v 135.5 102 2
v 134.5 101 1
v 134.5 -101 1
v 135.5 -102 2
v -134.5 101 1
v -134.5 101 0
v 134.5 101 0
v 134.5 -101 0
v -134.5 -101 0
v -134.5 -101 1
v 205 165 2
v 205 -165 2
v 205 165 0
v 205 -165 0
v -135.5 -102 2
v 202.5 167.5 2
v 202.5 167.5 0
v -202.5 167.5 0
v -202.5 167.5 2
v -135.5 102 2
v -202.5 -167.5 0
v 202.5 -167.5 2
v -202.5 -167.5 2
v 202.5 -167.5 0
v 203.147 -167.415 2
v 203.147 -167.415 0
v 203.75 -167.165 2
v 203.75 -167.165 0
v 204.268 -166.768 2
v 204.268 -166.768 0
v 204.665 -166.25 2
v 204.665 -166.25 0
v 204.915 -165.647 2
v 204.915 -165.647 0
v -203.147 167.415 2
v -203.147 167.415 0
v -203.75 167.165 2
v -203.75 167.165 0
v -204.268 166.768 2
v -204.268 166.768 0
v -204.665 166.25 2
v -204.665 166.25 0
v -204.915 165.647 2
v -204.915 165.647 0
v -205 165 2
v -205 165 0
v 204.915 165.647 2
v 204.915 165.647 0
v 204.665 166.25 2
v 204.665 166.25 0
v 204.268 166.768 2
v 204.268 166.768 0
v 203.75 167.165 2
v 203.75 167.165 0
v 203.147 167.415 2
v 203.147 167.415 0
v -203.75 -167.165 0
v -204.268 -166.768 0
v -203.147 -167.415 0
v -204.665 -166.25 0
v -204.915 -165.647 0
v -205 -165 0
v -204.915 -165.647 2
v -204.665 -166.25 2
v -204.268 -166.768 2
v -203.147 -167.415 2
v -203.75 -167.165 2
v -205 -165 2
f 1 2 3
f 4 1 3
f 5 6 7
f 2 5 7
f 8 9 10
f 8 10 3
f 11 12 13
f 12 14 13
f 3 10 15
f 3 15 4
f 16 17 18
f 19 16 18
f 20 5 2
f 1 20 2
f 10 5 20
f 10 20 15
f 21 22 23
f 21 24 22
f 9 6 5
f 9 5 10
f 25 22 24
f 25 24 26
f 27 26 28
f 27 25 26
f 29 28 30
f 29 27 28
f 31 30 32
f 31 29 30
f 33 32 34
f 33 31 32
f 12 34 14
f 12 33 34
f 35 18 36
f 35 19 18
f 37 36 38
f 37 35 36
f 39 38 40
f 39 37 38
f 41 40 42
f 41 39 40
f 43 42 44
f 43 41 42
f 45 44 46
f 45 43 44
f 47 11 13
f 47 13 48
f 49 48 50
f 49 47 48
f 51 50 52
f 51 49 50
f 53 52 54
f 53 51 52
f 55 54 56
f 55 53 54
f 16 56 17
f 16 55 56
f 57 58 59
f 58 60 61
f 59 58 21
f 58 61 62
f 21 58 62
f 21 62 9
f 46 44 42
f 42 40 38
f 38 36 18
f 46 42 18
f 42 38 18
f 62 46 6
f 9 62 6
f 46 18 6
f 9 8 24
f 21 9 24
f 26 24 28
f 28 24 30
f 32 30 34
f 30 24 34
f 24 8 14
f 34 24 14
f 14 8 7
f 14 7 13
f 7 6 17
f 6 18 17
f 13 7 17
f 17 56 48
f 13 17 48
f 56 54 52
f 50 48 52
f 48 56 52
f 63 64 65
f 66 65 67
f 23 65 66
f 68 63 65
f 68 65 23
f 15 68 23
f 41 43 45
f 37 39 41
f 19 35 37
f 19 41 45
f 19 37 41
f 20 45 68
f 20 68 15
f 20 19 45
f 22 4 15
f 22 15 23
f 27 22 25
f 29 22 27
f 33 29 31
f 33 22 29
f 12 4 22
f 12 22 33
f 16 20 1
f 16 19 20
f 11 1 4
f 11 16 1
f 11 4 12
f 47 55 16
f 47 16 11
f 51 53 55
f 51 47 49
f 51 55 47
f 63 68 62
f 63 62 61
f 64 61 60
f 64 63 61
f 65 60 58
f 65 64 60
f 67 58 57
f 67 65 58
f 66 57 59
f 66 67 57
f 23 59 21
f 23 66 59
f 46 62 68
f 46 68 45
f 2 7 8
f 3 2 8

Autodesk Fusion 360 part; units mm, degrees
sketch "Sketch1" plane through (0, 0, 0) normal (0, 0, 1) x (1, 0, 0)
  line L0 (0, 101) -> (134.5, 101)
  line L1 (134.5, 101) -> (134.5, 0)
  line L2 (134.5, 0) -> (205, 0)
  line L3 (205, 0) -> (205, 167.5)
  line L4 (205, 167.5) -> (0, 167.5)
  line L5 (0, 167.5) -> (0, 101)
  line L6 (-134.5, 101) -> (-134.5, 0)
  line L7 (-205, 0) -> (-205, 167.5)
  line L8 (-205, 167.5) -> (0, 167.5)
  line L9 (0, 101) -> (-134.5, 101)
  line L10 (0, 167.5) -> (0, 101)
  line L11 (-134.5, 0) -> (-205, 0)
  line L12 (134.5, -101) -> (134.5, 0)
  line L13 (205, -167.5) -> (0, -167.5)
  line L14 (0, -167.5) -> (0, -101)
  line L15 (0, -101) -> (-134.5, -101)
  line L16 (-134.5, 0) -> (-205, 0)
  line L17 (205, 0) -> (205, -167.5)
  line L18 (-205, 0) -> (-205, -167.5)
  line L19 (-205, -167.5) -> (0, -167.5)
  line L20 (-134.5, -101) -> (-134.5, 0)
  line L21 (0, -167.5) -> (0, -101)
  line L22 (0, -101) -> (134.5, -101)
  line L23 (134.5, 0) -> (205, 0)
  dimension "d26" = 101
  dimension "d27" = 134.5
  dimension "d28" = 101
  dimension "d29" = 70.5
  dimension "d30" = 167.5
  dimension "d31" = 205
  dimension "d32" = 66.5
extrude "Extrude4" add sketch "Sketch1" along normal blind 2 contours L0 L1 L2 L3 L4 L5 L10 L23 | L5 L6 L7 L8 L9 L10 L11 L16 | L2 L12 L13 L14 L17 L21 L22 L23 | L11 L14 L15 L16 L18 L19 L20 L21
chamfer "Chamfer2" distance 1 angle 45 4 edges at (0, 101, 2) (-134.5, 0, 2) (0, -101, 2) (134.5, 0, 2)
fillet "Fillet1" radius 2.5 4 edges at (205, -167.5, 1) (205, 167.5, 1) (-205, -167.5, 1) (-205, 167.5, 1)
